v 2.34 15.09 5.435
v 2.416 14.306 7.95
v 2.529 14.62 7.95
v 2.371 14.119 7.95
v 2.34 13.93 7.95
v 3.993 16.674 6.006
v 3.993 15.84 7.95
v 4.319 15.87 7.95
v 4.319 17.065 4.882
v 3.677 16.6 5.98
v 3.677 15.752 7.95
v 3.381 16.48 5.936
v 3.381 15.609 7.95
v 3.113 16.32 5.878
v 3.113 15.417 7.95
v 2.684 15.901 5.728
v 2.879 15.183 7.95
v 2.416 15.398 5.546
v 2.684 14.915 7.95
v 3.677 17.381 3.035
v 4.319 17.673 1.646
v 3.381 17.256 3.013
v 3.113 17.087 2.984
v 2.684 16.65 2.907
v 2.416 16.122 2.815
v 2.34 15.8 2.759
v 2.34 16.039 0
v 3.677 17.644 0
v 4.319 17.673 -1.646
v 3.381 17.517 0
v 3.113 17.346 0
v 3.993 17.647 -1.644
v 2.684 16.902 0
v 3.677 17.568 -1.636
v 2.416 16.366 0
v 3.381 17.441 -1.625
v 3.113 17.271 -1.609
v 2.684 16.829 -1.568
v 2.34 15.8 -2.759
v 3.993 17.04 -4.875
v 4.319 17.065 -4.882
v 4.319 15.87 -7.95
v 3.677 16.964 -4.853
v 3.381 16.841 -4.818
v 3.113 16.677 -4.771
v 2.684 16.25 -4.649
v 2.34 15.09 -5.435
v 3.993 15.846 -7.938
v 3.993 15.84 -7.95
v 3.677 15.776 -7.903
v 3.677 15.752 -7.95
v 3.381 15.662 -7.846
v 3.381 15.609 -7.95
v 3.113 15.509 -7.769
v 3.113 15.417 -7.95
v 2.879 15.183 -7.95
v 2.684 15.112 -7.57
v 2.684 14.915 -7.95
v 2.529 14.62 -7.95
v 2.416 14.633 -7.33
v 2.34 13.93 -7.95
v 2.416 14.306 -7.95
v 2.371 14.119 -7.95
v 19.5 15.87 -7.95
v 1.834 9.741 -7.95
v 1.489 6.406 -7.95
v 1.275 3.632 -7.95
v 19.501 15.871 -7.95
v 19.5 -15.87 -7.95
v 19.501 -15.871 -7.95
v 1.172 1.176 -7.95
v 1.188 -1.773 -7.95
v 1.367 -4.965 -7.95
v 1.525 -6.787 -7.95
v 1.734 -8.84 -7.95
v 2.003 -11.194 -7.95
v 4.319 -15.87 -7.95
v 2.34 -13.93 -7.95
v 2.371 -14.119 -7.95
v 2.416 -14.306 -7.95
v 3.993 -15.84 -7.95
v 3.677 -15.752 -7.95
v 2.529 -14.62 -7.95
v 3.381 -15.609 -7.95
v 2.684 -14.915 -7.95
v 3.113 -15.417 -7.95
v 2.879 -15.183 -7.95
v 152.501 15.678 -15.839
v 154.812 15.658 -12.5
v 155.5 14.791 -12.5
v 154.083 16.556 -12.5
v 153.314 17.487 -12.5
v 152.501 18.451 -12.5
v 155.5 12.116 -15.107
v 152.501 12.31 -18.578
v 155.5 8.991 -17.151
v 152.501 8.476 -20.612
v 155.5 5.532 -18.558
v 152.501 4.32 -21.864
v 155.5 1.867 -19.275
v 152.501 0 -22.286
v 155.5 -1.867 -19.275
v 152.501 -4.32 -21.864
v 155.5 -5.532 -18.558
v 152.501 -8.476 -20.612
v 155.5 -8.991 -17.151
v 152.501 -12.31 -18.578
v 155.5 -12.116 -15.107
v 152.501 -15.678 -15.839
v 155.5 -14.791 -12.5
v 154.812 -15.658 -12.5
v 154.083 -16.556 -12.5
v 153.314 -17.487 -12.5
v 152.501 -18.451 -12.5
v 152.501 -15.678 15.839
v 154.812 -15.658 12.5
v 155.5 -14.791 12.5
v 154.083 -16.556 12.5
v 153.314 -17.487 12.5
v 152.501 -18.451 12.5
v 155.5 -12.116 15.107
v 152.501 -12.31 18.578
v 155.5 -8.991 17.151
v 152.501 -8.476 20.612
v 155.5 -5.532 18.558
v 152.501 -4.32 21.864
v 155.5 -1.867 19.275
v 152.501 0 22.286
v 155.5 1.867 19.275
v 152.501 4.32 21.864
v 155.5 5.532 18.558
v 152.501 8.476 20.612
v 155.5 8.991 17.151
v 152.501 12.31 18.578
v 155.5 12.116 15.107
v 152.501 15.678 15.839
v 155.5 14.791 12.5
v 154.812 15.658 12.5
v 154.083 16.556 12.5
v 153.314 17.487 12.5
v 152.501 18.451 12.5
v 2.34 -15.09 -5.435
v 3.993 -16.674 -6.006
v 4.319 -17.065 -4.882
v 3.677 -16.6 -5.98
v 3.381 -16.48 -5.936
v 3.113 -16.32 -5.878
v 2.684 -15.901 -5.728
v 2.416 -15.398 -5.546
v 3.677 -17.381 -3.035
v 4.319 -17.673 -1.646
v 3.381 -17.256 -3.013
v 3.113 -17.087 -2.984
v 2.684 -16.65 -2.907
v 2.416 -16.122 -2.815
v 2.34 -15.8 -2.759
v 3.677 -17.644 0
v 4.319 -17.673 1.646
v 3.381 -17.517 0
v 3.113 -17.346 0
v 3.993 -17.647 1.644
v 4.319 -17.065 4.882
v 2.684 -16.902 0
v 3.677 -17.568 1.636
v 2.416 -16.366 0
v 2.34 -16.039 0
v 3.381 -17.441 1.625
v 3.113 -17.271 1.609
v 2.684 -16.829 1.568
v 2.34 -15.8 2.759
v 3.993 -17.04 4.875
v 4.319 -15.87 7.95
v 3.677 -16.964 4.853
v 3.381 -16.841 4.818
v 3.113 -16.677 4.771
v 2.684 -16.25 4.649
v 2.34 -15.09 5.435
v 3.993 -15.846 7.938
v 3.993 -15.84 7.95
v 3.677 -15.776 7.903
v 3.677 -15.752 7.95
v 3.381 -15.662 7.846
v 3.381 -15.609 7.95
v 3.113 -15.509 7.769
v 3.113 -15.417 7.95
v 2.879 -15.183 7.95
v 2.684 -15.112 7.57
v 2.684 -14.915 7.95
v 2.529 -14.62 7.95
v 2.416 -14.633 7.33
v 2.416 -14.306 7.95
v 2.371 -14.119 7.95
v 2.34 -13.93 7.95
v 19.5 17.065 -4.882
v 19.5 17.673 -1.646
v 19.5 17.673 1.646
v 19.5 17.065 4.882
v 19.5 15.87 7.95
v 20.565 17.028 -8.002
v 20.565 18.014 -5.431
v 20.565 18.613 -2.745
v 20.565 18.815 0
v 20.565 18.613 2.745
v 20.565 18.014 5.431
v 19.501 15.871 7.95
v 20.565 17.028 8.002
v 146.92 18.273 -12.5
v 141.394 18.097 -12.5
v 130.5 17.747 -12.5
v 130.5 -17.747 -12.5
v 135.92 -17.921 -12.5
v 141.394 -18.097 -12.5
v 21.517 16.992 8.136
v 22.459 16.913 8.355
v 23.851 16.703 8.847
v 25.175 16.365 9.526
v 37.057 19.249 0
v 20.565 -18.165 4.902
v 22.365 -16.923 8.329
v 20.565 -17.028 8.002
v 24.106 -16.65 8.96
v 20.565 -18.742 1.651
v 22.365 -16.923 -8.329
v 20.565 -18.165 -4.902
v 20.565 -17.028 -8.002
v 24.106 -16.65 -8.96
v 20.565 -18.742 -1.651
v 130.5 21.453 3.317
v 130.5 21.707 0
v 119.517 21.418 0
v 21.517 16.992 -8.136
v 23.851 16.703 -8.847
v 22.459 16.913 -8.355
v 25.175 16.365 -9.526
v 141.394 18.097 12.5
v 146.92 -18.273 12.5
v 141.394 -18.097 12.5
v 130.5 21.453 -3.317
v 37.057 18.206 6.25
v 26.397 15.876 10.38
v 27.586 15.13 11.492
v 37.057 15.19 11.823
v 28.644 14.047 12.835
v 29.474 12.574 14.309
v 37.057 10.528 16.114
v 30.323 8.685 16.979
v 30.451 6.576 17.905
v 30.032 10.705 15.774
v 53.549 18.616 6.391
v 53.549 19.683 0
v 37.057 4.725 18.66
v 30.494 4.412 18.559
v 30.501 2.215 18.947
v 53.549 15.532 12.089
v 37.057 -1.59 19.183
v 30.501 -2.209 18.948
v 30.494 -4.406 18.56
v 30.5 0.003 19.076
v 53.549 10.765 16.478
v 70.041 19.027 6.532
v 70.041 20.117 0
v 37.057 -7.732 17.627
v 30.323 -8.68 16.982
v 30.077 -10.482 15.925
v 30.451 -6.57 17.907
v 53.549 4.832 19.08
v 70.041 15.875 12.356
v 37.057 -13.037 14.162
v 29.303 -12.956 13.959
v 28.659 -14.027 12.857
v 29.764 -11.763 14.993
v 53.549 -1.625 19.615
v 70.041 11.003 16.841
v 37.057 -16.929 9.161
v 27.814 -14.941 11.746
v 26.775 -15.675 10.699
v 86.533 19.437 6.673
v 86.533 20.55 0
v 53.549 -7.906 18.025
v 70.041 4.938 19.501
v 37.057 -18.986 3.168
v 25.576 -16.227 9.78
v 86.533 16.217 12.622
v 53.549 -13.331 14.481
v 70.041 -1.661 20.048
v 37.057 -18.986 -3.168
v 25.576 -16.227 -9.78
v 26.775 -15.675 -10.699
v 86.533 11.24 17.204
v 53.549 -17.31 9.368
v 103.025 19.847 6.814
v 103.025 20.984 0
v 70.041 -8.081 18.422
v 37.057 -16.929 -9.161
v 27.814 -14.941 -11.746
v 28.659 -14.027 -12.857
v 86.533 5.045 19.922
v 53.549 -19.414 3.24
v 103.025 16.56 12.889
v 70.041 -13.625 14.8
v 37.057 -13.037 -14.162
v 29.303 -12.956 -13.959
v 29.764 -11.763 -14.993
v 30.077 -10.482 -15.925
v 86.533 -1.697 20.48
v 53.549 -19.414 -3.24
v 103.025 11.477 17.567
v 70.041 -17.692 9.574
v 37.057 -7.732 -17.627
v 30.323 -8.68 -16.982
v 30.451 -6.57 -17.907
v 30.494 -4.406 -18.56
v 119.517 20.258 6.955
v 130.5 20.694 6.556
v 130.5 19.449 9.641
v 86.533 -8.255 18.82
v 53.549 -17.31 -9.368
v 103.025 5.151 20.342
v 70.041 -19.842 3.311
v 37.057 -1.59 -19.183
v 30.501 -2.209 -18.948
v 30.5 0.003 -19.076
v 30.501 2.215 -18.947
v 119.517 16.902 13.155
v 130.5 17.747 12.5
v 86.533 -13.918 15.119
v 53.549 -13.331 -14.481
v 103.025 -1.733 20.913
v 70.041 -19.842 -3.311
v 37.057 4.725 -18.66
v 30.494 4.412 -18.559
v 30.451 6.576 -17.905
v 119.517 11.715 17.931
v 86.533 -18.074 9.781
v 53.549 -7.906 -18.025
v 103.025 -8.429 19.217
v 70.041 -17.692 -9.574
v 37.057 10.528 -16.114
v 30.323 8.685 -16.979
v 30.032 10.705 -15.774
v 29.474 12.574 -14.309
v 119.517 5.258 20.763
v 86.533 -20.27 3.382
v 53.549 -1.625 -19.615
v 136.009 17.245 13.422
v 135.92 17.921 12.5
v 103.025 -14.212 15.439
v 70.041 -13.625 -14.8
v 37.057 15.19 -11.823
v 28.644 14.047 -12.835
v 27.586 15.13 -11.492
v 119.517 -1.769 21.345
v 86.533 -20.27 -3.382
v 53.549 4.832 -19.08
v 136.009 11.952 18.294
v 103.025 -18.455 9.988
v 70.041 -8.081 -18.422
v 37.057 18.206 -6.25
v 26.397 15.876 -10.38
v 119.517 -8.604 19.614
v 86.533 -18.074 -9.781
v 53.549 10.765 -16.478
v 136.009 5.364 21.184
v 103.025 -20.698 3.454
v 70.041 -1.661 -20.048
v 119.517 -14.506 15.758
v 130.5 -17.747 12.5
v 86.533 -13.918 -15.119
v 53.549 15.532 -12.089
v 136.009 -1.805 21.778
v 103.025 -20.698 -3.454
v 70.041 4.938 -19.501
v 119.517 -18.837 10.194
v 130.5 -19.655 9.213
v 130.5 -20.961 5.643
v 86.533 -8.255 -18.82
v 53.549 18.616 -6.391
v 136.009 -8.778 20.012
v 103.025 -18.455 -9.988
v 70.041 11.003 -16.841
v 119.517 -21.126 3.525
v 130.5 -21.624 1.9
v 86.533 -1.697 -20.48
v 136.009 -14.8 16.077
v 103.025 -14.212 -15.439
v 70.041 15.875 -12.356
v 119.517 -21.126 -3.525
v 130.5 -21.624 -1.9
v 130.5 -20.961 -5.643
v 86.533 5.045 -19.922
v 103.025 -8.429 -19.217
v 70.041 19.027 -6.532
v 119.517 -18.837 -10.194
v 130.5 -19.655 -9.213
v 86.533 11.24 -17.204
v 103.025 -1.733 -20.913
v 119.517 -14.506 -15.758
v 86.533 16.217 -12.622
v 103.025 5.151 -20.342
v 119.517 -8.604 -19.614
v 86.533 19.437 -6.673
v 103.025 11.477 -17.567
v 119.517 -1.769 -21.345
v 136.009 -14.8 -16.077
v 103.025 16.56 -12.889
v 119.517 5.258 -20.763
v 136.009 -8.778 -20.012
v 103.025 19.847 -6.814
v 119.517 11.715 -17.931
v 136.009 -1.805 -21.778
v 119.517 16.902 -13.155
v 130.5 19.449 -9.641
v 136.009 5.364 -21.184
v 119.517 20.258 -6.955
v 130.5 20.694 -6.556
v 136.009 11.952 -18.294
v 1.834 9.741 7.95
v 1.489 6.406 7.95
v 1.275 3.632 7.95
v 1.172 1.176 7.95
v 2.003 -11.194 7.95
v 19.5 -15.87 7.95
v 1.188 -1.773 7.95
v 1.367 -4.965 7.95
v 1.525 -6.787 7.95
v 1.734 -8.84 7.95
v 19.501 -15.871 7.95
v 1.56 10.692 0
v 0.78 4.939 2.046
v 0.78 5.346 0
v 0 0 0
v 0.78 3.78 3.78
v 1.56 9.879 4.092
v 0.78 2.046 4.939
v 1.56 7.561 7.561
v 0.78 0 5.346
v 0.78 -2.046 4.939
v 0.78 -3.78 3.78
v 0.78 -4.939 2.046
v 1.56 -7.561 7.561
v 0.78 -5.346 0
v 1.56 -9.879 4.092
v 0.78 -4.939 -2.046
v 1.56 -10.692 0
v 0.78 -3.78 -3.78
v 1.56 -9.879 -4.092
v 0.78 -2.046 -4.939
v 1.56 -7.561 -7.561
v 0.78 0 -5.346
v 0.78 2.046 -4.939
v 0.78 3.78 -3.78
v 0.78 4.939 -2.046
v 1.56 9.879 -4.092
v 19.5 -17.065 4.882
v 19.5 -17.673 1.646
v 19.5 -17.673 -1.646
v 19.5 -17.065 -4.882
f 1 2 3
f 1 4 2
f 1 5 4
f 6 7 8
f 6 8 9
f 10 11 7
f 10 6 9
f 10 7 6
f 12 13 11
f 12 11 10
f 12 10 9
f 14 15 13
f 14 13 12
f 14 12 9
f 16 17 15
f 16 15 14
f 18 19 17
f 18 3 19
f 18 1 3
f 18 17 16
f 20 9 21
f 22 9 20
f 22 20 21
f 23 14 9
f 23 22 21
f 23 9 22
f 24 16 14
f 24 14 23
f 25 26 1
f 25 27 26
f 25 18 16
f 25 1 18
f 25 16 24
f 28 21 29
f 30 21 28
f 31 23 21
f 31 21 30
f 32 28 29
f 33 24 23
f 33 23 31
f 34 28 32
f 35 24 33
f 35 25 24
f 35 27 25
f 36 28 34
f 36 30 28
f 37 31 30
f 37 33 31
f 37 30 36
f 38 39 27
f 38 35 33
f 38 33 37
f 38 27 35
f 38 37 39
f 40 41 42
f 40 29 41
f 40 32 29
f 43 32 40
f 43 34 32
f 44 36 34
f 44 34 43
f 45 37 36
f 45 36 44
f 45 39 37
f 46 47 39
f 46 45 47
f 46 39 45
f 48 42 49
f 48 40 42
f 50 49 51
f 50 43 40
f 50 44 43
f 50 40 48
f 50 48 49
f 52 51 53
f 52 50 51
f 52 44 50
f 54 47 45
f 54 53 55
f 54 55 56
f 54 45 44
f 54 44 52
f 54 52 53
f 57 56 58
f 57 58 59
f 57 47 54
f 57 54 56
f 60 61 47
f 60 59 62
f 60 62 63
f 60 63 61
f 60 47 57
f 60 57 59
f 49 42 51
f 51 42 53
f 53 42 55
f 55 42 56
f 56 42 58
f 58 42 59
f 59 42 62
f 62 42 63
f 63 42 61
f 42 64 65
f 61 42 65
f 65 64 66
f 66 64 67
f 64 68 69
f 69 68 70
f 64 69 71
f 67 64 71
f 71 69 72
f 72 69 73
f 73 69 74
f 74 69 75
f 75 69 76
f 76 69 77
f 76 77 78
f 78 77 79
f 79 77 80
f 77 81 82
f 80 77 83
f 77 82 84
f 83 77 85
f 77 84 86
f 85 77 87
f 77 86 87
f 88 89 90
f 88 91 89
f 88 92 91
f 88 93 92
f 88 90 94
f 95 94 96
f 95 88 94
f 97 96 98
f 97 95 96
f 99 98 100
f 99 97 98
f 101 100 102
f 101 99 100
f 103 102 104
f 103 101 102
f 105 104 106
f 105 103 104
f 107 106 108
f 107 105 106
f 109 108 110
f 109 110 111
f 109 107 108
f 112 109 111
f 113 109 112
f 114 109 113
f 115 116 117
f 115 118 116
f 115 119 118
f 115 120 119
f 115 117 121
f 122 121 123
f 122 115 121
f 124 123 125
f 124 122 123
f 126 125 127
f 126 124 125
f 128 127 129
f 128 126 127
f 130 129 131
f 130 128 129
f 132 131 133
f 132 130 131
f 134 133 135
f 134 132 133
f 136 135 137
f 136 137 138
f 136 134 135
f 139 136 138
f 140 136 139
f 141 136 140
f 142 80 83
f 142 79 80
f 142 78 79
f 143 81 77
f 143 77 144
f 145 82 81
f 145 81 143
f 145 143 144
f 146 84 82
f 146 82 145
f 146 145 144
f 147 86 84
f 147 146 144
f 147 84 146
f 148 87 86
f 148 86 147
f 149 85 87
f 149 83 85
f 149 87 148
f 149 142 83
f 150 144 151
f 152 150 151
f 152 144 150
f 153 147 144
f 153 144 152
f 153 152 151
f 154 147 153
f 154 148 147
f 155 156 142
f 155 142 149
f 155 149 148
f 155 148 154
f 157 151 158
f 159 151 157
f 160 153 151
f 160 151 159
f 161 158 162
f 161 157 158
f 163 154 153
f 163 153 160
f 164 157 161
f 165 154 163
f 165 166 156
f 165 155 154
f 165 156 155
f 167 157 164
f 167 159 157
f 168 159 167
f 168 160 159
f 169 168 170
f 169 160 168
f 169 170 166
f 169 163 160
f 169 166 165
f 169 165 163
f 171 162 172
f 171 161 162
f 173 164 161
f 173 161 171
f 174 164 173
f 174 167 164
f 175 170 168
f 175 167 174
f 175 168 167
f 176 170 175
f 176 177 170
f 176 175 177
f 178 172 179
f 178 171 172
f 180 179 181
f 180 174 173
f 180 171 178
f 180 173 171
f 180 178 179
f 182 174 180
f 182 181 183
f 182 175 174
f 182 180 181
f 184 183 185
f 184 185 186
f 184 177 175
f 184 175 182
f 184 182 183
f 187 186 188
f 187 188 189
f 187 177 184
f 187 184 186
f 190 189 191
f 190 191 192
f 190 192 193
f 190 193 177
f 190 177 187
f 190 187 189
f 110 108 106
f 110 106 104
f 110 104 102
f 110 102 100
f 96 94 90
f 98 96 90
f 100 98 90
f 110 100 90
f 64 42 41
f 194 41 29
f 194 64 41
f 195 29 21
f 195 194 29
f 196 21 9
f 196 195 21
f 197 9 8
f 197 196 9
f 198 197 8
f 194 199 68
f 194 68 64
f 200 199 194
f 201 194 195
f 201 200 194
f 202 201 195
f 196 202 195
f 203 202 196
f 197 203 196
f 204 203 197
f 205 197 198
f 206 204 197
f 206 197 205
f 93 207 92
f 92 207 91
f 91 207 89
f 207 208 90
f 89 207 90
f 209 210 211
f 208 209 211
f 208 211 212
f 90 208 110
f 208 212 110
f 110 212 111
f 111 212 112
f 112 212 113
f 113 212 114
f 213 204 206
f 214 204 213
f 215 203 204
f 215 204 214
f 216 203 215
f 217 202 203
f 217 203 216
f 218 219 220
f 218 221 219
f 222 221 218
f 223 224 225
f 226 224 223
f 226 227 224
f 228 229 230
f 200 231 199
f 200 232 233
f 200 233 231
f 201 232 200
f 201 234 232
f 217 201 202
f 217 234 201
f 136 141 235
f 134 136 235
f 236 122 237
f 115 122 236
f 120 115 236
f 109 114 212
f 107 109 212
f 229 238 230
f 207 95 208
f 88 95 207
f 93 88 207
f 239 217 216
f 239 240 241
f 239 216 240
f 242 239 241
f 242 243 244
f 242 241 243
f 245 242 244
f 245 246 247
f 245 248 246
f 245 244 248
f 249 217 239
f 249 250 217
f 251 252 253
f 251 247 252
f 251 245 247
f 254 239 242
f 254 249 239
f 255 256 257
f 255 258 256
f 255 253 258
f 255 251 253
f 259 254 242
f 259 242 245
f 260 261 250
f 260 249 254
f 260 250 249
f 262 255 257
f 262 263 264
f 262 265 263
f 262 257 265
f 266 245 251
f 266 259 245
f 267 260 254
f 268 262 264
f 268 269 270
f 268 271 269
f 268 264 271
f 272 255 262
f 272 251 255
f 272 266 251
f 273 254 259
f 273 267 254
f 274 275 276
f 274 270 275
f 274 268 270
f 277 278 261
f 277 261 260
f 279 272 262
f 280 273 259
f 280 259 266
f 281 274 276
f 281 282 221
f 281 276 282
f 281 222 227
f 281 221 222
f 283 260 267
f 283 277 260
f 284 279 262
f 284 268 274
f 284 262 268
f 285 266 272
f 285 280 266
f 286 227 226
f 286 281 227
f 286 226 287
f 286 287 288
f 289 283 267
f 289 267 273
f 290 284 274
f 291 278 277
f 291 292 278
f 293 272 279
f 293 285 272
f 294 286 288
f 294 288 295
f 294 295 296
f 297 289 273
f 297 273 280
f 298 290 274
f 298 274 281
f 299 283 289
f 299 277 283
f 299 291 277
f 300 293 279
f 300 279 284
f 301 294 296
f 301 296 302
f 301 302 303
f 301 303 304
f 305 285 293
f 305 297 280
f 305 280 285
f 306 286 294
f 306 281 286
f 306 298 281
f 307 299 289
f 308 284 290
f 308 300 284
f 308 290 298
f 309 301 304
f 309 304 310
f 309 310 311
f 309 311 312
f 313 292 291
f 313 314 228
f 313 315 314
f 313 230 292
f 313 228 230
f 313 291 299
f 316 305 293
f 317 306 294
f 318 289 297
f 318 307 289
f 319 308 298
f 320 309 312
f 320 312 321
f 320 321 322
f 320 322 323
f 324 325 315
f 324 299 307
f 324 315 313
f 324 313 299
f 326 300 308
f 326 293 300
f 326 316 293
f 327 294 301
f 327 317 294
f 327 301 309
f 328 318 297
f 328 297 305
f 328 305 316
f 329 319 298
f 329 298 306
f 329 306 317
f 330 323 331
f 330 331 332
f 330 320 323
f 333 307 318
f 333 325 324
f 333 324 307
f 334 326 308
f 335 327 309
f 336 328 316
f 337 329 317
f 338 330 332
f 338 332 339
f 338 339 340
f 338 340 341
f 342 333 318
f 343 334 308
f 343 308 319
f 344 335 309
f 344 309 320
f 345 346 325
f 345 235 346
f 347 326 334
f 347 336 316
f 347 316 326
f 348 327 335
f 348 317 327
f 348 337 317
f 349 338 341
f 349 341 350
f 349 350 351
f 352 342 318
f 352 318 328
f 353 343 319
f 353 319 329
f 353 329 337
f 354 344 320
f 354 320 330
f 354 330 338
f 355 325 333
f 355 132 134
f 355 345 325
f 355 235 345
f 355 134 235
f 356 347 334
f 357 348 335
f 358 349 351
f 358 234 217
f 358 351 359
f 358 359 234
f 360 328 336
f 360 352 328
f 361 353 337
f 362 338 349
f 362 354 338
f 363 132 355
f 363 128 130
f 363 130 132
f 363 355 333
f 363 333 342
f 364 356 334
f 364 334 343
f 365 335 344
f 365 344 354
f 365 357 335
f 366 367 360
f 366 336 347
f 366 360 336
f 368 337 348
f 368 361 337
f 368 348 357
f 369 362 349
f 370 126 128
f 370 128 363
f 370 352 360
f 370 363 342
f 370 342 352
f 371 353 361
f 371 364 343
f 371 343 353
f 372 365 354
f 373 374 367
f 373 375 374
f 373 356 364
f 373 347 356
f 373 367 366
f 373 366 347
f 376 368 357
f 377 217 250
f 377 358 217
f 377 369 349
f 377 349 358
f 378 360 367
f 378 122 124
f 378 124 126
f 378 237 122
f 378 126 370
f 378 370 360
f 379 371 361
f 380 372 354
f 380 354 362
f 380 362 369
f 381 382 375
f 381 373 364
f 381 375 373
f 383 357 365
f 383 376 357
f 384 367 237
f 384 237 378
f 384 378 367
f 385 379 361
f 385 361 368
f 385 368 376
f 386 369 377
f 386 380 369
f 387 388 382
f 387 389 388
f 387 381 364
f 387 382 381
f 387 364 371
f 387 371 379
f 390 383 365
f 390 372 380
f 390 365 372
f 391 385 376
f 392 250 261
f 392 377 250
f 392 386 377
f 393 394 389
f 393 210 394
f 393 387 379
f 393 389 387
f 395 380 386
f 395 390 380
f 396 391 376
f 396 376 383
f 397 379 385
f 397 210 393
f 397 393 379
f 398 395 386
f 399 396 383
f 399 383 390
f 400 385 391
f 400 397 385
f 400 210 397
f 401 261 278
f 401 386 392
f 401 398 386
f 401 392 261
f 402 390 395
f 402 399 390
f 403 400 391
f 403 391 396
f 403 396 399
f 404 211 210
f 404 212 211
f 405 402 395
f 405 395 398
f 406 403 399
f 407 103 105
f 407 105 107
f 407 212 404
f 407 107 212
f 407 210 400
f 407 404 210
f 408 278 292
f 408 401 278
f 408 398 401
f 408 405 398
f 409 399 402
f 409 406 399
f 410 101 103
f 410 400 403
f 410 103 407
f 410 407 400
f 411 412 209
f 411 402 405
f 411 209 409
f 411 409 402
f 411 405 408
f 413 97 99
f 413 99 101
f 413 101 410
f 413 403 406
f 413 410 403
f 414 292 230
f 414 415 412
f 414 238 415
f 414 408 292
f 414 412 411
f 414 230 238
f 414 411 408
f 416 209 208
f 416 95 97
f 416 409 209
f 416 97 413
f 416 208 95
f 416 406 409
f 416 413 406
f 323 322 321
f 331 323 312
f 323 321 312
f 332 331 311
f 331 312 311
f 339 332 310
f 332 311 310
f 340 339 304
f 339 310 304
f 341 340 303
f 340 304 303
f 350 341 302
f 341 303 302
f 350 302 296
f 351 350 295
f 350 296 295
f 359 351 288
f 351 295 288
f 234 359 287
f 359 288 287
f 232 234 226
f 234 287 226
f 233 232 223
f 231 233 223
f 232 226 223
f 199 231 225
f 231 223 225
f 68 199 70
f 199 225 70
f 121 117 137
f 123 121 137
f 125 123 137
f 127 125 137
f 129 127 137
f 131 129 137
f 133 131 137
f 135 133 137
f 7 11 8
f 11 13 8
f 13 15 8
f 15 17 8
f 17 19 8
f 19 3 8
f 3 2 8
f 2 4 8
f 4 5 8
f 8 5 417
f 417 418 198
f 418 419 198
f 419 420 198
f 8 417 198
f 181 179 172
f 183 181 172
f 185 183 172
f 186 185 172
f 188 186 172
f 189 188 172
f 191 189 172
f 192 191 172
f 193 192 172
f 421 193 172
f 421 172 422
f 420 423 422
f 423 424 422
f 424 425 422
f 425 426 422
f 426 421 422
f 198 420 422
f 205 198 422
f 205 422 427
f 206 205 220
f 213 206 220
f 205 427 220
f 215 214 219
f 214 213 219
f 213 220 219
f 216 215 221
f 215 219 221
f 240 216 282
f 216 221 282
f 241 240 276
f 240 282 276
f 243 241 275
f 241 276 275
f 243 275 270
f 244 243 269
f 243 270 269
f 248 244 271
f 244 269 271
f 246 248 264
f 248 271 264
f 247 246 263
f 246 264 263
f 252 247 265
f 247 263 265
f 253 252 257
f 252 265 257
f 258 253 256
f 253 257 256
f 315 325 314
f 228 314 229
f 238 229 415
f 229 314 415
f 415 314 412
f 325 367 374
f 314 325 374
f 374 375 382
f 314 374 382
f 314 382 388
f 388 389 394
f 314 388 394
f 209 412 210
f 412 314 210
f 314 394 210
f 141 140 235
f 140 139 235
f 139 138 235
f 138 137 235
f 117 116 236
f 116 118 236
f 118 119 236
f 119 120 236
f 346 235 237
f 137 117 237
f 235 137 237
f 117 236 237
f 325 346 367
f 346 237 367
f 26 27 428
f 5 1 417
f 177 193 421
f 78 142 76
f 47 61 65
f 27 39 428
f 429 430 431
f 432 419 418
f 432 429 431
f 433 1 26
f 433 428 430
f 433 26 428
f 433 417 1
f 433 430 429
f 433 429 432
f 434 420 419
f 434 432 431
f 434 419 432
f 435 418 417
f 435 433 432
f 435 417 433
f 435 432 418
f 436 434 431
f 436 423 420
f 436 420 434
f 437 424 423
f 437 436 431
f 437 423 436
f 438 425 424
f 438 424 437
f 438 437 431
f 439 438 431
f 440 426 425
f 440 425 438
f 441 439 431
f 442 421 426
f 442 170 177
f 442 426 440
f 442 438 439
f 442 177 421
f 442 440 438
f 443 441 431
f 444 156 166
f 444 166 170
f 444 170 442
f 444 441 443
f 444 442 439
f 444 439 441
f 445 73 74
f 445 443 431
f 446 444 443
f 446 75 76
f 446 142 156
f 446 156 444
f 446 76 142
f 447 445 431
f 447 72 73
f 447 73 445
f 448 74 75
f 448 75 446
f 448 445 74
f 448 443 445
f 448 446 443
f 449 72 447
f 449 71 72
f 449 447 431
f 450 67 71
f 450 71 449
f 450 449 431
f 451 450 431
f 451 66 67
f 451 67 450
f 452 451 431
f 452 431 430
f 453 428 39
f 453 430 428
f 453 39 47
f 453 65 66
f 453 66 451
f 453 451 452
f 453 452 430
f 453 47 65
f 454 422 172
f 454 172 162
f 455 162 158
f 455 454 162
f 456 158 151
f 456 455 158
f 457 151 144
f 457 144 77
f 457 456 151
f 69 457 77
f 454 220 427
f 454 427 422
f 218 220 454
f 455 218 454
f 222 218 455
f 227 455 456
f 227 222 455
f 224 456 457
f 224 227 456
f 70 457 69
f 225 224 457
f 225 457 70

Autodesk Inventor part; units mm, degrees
ref_plane "YZ Plane" through (0, 0, 0) normal (1, 0, 0) x (0, 1, 0)
ref_plane "XZ Plane" through (0, 0, 0) normal (0, 1, 0) x (-1, 0, 0)
ref_plane "XY Plane" through (0, 0, 0) normal (0, 0, 1) x (1, 0, 0)
sketch "Sketch1" plane through (0, 0, 0) normal (0, 0, 1) x (1, 0, 0)
  line L0 (0, 0) -> (0, 18.2735) construction
  line L1 (0, 18.2735) -> (20.5646, 18.8146) construction
  line L2 (155.5, 22.3653) -> (155.5, 0)
  line L3 (155.5, 0) -> (0, 0)
  line L4 (149.2, 22.1995) -> (149.2, 0) construction
  line L5 (0, 0) -> (2.3398, 16.0387)
  line L6 (4.3188, 17.75) -> (19.5, 17.75)
  line L7 (19.5, 17.75) -> (20.5646, 18.8146)
  arc A0 (4.3188, 17.75) -> (2.3398, 16.0387) centre (4.3188, 15.75) ccw
  line L8 (20.5646, 18.8146) -> (155.5, 22.3653)
  dimension "d0" = 36.547
  dimension "d1" = 155.5
  dimension "d2" = 44.399
  dimension "d3" = 149.2
  dimension "d4" = 35.5
  dimension "d5" = 45
  dimension "d6" = 19.5
  dimension "d7" = 2
  dimension "d8" = 8.3
revolve "Revolution1" add sketch "Sketch1" angle 360 about axis through (155.5, 0, 0) along (-1, 0, 0)
sketch "Sketch2" plane through (0, 0, 0) normal (0, 1, 0) x (-1, 0, 0)
  line L0 (0, 7.95) -> (-19.5007, 7.95)
  arc A0 (-24.5298, 28.7331) -> (-19.5007, 7.95) centre (-19.5007, 18.95) ccw
  line L1 (-24.5298, 28.7331) -> (0, 28.7331)
  line L2 (0, 28.7331) -> (0, 7.95)
  line L3 (31.1, 0) -> (-186.6, 0) projected
  line L4 (-20.5646, 18.8146) -> (-155.5, 22.3653) construction
  point P0 (0, 0)
  point P1 (-30.5, 19.0761)
  dimension "d10" = 15.9
  dimension "d11" = 11
  dimension "d12" = 30.5
extrude "Extrusion1" cut sketch "Sketch2" along normal through all both and the other way through all
mirror "Mirror1" about plane through (0, 0, 0) normal (0, 0, 1) of "Extrusion1"
chamfer "Chamfer1" distance 3 angle 45 1 edges at (155.5, -22.3653, 0)
sketch "Sketch3" plane through (0, 0, 0) normal (0, 1, 0) x (-1, 0, 0)
  line L0 (-155.5, 12.5) -> (-130.5, 12.5)
  line L1 (-130.5, 12.5) -> (-130.5, -12.5)
  line L2 (-130.5, -12.5) -> (-155.5, -12.5)
  line L3 (-155.5, -12.5) -> (-155.5, 12.5)
  line L4 (-155.5, -19.3653) -> (-155.5, 19.3653) construction
  point P0 (0, 0)
  point P1 (-155.5, 0)
  dimension "d18" = 25
  dimension "d19" = 25
extrude "Extrusion2" cut sketch "Sketch3" along normal through all both and the other way through all
properties part number "Part005.Morse 5 shaft" material "Steel, Alloy"
